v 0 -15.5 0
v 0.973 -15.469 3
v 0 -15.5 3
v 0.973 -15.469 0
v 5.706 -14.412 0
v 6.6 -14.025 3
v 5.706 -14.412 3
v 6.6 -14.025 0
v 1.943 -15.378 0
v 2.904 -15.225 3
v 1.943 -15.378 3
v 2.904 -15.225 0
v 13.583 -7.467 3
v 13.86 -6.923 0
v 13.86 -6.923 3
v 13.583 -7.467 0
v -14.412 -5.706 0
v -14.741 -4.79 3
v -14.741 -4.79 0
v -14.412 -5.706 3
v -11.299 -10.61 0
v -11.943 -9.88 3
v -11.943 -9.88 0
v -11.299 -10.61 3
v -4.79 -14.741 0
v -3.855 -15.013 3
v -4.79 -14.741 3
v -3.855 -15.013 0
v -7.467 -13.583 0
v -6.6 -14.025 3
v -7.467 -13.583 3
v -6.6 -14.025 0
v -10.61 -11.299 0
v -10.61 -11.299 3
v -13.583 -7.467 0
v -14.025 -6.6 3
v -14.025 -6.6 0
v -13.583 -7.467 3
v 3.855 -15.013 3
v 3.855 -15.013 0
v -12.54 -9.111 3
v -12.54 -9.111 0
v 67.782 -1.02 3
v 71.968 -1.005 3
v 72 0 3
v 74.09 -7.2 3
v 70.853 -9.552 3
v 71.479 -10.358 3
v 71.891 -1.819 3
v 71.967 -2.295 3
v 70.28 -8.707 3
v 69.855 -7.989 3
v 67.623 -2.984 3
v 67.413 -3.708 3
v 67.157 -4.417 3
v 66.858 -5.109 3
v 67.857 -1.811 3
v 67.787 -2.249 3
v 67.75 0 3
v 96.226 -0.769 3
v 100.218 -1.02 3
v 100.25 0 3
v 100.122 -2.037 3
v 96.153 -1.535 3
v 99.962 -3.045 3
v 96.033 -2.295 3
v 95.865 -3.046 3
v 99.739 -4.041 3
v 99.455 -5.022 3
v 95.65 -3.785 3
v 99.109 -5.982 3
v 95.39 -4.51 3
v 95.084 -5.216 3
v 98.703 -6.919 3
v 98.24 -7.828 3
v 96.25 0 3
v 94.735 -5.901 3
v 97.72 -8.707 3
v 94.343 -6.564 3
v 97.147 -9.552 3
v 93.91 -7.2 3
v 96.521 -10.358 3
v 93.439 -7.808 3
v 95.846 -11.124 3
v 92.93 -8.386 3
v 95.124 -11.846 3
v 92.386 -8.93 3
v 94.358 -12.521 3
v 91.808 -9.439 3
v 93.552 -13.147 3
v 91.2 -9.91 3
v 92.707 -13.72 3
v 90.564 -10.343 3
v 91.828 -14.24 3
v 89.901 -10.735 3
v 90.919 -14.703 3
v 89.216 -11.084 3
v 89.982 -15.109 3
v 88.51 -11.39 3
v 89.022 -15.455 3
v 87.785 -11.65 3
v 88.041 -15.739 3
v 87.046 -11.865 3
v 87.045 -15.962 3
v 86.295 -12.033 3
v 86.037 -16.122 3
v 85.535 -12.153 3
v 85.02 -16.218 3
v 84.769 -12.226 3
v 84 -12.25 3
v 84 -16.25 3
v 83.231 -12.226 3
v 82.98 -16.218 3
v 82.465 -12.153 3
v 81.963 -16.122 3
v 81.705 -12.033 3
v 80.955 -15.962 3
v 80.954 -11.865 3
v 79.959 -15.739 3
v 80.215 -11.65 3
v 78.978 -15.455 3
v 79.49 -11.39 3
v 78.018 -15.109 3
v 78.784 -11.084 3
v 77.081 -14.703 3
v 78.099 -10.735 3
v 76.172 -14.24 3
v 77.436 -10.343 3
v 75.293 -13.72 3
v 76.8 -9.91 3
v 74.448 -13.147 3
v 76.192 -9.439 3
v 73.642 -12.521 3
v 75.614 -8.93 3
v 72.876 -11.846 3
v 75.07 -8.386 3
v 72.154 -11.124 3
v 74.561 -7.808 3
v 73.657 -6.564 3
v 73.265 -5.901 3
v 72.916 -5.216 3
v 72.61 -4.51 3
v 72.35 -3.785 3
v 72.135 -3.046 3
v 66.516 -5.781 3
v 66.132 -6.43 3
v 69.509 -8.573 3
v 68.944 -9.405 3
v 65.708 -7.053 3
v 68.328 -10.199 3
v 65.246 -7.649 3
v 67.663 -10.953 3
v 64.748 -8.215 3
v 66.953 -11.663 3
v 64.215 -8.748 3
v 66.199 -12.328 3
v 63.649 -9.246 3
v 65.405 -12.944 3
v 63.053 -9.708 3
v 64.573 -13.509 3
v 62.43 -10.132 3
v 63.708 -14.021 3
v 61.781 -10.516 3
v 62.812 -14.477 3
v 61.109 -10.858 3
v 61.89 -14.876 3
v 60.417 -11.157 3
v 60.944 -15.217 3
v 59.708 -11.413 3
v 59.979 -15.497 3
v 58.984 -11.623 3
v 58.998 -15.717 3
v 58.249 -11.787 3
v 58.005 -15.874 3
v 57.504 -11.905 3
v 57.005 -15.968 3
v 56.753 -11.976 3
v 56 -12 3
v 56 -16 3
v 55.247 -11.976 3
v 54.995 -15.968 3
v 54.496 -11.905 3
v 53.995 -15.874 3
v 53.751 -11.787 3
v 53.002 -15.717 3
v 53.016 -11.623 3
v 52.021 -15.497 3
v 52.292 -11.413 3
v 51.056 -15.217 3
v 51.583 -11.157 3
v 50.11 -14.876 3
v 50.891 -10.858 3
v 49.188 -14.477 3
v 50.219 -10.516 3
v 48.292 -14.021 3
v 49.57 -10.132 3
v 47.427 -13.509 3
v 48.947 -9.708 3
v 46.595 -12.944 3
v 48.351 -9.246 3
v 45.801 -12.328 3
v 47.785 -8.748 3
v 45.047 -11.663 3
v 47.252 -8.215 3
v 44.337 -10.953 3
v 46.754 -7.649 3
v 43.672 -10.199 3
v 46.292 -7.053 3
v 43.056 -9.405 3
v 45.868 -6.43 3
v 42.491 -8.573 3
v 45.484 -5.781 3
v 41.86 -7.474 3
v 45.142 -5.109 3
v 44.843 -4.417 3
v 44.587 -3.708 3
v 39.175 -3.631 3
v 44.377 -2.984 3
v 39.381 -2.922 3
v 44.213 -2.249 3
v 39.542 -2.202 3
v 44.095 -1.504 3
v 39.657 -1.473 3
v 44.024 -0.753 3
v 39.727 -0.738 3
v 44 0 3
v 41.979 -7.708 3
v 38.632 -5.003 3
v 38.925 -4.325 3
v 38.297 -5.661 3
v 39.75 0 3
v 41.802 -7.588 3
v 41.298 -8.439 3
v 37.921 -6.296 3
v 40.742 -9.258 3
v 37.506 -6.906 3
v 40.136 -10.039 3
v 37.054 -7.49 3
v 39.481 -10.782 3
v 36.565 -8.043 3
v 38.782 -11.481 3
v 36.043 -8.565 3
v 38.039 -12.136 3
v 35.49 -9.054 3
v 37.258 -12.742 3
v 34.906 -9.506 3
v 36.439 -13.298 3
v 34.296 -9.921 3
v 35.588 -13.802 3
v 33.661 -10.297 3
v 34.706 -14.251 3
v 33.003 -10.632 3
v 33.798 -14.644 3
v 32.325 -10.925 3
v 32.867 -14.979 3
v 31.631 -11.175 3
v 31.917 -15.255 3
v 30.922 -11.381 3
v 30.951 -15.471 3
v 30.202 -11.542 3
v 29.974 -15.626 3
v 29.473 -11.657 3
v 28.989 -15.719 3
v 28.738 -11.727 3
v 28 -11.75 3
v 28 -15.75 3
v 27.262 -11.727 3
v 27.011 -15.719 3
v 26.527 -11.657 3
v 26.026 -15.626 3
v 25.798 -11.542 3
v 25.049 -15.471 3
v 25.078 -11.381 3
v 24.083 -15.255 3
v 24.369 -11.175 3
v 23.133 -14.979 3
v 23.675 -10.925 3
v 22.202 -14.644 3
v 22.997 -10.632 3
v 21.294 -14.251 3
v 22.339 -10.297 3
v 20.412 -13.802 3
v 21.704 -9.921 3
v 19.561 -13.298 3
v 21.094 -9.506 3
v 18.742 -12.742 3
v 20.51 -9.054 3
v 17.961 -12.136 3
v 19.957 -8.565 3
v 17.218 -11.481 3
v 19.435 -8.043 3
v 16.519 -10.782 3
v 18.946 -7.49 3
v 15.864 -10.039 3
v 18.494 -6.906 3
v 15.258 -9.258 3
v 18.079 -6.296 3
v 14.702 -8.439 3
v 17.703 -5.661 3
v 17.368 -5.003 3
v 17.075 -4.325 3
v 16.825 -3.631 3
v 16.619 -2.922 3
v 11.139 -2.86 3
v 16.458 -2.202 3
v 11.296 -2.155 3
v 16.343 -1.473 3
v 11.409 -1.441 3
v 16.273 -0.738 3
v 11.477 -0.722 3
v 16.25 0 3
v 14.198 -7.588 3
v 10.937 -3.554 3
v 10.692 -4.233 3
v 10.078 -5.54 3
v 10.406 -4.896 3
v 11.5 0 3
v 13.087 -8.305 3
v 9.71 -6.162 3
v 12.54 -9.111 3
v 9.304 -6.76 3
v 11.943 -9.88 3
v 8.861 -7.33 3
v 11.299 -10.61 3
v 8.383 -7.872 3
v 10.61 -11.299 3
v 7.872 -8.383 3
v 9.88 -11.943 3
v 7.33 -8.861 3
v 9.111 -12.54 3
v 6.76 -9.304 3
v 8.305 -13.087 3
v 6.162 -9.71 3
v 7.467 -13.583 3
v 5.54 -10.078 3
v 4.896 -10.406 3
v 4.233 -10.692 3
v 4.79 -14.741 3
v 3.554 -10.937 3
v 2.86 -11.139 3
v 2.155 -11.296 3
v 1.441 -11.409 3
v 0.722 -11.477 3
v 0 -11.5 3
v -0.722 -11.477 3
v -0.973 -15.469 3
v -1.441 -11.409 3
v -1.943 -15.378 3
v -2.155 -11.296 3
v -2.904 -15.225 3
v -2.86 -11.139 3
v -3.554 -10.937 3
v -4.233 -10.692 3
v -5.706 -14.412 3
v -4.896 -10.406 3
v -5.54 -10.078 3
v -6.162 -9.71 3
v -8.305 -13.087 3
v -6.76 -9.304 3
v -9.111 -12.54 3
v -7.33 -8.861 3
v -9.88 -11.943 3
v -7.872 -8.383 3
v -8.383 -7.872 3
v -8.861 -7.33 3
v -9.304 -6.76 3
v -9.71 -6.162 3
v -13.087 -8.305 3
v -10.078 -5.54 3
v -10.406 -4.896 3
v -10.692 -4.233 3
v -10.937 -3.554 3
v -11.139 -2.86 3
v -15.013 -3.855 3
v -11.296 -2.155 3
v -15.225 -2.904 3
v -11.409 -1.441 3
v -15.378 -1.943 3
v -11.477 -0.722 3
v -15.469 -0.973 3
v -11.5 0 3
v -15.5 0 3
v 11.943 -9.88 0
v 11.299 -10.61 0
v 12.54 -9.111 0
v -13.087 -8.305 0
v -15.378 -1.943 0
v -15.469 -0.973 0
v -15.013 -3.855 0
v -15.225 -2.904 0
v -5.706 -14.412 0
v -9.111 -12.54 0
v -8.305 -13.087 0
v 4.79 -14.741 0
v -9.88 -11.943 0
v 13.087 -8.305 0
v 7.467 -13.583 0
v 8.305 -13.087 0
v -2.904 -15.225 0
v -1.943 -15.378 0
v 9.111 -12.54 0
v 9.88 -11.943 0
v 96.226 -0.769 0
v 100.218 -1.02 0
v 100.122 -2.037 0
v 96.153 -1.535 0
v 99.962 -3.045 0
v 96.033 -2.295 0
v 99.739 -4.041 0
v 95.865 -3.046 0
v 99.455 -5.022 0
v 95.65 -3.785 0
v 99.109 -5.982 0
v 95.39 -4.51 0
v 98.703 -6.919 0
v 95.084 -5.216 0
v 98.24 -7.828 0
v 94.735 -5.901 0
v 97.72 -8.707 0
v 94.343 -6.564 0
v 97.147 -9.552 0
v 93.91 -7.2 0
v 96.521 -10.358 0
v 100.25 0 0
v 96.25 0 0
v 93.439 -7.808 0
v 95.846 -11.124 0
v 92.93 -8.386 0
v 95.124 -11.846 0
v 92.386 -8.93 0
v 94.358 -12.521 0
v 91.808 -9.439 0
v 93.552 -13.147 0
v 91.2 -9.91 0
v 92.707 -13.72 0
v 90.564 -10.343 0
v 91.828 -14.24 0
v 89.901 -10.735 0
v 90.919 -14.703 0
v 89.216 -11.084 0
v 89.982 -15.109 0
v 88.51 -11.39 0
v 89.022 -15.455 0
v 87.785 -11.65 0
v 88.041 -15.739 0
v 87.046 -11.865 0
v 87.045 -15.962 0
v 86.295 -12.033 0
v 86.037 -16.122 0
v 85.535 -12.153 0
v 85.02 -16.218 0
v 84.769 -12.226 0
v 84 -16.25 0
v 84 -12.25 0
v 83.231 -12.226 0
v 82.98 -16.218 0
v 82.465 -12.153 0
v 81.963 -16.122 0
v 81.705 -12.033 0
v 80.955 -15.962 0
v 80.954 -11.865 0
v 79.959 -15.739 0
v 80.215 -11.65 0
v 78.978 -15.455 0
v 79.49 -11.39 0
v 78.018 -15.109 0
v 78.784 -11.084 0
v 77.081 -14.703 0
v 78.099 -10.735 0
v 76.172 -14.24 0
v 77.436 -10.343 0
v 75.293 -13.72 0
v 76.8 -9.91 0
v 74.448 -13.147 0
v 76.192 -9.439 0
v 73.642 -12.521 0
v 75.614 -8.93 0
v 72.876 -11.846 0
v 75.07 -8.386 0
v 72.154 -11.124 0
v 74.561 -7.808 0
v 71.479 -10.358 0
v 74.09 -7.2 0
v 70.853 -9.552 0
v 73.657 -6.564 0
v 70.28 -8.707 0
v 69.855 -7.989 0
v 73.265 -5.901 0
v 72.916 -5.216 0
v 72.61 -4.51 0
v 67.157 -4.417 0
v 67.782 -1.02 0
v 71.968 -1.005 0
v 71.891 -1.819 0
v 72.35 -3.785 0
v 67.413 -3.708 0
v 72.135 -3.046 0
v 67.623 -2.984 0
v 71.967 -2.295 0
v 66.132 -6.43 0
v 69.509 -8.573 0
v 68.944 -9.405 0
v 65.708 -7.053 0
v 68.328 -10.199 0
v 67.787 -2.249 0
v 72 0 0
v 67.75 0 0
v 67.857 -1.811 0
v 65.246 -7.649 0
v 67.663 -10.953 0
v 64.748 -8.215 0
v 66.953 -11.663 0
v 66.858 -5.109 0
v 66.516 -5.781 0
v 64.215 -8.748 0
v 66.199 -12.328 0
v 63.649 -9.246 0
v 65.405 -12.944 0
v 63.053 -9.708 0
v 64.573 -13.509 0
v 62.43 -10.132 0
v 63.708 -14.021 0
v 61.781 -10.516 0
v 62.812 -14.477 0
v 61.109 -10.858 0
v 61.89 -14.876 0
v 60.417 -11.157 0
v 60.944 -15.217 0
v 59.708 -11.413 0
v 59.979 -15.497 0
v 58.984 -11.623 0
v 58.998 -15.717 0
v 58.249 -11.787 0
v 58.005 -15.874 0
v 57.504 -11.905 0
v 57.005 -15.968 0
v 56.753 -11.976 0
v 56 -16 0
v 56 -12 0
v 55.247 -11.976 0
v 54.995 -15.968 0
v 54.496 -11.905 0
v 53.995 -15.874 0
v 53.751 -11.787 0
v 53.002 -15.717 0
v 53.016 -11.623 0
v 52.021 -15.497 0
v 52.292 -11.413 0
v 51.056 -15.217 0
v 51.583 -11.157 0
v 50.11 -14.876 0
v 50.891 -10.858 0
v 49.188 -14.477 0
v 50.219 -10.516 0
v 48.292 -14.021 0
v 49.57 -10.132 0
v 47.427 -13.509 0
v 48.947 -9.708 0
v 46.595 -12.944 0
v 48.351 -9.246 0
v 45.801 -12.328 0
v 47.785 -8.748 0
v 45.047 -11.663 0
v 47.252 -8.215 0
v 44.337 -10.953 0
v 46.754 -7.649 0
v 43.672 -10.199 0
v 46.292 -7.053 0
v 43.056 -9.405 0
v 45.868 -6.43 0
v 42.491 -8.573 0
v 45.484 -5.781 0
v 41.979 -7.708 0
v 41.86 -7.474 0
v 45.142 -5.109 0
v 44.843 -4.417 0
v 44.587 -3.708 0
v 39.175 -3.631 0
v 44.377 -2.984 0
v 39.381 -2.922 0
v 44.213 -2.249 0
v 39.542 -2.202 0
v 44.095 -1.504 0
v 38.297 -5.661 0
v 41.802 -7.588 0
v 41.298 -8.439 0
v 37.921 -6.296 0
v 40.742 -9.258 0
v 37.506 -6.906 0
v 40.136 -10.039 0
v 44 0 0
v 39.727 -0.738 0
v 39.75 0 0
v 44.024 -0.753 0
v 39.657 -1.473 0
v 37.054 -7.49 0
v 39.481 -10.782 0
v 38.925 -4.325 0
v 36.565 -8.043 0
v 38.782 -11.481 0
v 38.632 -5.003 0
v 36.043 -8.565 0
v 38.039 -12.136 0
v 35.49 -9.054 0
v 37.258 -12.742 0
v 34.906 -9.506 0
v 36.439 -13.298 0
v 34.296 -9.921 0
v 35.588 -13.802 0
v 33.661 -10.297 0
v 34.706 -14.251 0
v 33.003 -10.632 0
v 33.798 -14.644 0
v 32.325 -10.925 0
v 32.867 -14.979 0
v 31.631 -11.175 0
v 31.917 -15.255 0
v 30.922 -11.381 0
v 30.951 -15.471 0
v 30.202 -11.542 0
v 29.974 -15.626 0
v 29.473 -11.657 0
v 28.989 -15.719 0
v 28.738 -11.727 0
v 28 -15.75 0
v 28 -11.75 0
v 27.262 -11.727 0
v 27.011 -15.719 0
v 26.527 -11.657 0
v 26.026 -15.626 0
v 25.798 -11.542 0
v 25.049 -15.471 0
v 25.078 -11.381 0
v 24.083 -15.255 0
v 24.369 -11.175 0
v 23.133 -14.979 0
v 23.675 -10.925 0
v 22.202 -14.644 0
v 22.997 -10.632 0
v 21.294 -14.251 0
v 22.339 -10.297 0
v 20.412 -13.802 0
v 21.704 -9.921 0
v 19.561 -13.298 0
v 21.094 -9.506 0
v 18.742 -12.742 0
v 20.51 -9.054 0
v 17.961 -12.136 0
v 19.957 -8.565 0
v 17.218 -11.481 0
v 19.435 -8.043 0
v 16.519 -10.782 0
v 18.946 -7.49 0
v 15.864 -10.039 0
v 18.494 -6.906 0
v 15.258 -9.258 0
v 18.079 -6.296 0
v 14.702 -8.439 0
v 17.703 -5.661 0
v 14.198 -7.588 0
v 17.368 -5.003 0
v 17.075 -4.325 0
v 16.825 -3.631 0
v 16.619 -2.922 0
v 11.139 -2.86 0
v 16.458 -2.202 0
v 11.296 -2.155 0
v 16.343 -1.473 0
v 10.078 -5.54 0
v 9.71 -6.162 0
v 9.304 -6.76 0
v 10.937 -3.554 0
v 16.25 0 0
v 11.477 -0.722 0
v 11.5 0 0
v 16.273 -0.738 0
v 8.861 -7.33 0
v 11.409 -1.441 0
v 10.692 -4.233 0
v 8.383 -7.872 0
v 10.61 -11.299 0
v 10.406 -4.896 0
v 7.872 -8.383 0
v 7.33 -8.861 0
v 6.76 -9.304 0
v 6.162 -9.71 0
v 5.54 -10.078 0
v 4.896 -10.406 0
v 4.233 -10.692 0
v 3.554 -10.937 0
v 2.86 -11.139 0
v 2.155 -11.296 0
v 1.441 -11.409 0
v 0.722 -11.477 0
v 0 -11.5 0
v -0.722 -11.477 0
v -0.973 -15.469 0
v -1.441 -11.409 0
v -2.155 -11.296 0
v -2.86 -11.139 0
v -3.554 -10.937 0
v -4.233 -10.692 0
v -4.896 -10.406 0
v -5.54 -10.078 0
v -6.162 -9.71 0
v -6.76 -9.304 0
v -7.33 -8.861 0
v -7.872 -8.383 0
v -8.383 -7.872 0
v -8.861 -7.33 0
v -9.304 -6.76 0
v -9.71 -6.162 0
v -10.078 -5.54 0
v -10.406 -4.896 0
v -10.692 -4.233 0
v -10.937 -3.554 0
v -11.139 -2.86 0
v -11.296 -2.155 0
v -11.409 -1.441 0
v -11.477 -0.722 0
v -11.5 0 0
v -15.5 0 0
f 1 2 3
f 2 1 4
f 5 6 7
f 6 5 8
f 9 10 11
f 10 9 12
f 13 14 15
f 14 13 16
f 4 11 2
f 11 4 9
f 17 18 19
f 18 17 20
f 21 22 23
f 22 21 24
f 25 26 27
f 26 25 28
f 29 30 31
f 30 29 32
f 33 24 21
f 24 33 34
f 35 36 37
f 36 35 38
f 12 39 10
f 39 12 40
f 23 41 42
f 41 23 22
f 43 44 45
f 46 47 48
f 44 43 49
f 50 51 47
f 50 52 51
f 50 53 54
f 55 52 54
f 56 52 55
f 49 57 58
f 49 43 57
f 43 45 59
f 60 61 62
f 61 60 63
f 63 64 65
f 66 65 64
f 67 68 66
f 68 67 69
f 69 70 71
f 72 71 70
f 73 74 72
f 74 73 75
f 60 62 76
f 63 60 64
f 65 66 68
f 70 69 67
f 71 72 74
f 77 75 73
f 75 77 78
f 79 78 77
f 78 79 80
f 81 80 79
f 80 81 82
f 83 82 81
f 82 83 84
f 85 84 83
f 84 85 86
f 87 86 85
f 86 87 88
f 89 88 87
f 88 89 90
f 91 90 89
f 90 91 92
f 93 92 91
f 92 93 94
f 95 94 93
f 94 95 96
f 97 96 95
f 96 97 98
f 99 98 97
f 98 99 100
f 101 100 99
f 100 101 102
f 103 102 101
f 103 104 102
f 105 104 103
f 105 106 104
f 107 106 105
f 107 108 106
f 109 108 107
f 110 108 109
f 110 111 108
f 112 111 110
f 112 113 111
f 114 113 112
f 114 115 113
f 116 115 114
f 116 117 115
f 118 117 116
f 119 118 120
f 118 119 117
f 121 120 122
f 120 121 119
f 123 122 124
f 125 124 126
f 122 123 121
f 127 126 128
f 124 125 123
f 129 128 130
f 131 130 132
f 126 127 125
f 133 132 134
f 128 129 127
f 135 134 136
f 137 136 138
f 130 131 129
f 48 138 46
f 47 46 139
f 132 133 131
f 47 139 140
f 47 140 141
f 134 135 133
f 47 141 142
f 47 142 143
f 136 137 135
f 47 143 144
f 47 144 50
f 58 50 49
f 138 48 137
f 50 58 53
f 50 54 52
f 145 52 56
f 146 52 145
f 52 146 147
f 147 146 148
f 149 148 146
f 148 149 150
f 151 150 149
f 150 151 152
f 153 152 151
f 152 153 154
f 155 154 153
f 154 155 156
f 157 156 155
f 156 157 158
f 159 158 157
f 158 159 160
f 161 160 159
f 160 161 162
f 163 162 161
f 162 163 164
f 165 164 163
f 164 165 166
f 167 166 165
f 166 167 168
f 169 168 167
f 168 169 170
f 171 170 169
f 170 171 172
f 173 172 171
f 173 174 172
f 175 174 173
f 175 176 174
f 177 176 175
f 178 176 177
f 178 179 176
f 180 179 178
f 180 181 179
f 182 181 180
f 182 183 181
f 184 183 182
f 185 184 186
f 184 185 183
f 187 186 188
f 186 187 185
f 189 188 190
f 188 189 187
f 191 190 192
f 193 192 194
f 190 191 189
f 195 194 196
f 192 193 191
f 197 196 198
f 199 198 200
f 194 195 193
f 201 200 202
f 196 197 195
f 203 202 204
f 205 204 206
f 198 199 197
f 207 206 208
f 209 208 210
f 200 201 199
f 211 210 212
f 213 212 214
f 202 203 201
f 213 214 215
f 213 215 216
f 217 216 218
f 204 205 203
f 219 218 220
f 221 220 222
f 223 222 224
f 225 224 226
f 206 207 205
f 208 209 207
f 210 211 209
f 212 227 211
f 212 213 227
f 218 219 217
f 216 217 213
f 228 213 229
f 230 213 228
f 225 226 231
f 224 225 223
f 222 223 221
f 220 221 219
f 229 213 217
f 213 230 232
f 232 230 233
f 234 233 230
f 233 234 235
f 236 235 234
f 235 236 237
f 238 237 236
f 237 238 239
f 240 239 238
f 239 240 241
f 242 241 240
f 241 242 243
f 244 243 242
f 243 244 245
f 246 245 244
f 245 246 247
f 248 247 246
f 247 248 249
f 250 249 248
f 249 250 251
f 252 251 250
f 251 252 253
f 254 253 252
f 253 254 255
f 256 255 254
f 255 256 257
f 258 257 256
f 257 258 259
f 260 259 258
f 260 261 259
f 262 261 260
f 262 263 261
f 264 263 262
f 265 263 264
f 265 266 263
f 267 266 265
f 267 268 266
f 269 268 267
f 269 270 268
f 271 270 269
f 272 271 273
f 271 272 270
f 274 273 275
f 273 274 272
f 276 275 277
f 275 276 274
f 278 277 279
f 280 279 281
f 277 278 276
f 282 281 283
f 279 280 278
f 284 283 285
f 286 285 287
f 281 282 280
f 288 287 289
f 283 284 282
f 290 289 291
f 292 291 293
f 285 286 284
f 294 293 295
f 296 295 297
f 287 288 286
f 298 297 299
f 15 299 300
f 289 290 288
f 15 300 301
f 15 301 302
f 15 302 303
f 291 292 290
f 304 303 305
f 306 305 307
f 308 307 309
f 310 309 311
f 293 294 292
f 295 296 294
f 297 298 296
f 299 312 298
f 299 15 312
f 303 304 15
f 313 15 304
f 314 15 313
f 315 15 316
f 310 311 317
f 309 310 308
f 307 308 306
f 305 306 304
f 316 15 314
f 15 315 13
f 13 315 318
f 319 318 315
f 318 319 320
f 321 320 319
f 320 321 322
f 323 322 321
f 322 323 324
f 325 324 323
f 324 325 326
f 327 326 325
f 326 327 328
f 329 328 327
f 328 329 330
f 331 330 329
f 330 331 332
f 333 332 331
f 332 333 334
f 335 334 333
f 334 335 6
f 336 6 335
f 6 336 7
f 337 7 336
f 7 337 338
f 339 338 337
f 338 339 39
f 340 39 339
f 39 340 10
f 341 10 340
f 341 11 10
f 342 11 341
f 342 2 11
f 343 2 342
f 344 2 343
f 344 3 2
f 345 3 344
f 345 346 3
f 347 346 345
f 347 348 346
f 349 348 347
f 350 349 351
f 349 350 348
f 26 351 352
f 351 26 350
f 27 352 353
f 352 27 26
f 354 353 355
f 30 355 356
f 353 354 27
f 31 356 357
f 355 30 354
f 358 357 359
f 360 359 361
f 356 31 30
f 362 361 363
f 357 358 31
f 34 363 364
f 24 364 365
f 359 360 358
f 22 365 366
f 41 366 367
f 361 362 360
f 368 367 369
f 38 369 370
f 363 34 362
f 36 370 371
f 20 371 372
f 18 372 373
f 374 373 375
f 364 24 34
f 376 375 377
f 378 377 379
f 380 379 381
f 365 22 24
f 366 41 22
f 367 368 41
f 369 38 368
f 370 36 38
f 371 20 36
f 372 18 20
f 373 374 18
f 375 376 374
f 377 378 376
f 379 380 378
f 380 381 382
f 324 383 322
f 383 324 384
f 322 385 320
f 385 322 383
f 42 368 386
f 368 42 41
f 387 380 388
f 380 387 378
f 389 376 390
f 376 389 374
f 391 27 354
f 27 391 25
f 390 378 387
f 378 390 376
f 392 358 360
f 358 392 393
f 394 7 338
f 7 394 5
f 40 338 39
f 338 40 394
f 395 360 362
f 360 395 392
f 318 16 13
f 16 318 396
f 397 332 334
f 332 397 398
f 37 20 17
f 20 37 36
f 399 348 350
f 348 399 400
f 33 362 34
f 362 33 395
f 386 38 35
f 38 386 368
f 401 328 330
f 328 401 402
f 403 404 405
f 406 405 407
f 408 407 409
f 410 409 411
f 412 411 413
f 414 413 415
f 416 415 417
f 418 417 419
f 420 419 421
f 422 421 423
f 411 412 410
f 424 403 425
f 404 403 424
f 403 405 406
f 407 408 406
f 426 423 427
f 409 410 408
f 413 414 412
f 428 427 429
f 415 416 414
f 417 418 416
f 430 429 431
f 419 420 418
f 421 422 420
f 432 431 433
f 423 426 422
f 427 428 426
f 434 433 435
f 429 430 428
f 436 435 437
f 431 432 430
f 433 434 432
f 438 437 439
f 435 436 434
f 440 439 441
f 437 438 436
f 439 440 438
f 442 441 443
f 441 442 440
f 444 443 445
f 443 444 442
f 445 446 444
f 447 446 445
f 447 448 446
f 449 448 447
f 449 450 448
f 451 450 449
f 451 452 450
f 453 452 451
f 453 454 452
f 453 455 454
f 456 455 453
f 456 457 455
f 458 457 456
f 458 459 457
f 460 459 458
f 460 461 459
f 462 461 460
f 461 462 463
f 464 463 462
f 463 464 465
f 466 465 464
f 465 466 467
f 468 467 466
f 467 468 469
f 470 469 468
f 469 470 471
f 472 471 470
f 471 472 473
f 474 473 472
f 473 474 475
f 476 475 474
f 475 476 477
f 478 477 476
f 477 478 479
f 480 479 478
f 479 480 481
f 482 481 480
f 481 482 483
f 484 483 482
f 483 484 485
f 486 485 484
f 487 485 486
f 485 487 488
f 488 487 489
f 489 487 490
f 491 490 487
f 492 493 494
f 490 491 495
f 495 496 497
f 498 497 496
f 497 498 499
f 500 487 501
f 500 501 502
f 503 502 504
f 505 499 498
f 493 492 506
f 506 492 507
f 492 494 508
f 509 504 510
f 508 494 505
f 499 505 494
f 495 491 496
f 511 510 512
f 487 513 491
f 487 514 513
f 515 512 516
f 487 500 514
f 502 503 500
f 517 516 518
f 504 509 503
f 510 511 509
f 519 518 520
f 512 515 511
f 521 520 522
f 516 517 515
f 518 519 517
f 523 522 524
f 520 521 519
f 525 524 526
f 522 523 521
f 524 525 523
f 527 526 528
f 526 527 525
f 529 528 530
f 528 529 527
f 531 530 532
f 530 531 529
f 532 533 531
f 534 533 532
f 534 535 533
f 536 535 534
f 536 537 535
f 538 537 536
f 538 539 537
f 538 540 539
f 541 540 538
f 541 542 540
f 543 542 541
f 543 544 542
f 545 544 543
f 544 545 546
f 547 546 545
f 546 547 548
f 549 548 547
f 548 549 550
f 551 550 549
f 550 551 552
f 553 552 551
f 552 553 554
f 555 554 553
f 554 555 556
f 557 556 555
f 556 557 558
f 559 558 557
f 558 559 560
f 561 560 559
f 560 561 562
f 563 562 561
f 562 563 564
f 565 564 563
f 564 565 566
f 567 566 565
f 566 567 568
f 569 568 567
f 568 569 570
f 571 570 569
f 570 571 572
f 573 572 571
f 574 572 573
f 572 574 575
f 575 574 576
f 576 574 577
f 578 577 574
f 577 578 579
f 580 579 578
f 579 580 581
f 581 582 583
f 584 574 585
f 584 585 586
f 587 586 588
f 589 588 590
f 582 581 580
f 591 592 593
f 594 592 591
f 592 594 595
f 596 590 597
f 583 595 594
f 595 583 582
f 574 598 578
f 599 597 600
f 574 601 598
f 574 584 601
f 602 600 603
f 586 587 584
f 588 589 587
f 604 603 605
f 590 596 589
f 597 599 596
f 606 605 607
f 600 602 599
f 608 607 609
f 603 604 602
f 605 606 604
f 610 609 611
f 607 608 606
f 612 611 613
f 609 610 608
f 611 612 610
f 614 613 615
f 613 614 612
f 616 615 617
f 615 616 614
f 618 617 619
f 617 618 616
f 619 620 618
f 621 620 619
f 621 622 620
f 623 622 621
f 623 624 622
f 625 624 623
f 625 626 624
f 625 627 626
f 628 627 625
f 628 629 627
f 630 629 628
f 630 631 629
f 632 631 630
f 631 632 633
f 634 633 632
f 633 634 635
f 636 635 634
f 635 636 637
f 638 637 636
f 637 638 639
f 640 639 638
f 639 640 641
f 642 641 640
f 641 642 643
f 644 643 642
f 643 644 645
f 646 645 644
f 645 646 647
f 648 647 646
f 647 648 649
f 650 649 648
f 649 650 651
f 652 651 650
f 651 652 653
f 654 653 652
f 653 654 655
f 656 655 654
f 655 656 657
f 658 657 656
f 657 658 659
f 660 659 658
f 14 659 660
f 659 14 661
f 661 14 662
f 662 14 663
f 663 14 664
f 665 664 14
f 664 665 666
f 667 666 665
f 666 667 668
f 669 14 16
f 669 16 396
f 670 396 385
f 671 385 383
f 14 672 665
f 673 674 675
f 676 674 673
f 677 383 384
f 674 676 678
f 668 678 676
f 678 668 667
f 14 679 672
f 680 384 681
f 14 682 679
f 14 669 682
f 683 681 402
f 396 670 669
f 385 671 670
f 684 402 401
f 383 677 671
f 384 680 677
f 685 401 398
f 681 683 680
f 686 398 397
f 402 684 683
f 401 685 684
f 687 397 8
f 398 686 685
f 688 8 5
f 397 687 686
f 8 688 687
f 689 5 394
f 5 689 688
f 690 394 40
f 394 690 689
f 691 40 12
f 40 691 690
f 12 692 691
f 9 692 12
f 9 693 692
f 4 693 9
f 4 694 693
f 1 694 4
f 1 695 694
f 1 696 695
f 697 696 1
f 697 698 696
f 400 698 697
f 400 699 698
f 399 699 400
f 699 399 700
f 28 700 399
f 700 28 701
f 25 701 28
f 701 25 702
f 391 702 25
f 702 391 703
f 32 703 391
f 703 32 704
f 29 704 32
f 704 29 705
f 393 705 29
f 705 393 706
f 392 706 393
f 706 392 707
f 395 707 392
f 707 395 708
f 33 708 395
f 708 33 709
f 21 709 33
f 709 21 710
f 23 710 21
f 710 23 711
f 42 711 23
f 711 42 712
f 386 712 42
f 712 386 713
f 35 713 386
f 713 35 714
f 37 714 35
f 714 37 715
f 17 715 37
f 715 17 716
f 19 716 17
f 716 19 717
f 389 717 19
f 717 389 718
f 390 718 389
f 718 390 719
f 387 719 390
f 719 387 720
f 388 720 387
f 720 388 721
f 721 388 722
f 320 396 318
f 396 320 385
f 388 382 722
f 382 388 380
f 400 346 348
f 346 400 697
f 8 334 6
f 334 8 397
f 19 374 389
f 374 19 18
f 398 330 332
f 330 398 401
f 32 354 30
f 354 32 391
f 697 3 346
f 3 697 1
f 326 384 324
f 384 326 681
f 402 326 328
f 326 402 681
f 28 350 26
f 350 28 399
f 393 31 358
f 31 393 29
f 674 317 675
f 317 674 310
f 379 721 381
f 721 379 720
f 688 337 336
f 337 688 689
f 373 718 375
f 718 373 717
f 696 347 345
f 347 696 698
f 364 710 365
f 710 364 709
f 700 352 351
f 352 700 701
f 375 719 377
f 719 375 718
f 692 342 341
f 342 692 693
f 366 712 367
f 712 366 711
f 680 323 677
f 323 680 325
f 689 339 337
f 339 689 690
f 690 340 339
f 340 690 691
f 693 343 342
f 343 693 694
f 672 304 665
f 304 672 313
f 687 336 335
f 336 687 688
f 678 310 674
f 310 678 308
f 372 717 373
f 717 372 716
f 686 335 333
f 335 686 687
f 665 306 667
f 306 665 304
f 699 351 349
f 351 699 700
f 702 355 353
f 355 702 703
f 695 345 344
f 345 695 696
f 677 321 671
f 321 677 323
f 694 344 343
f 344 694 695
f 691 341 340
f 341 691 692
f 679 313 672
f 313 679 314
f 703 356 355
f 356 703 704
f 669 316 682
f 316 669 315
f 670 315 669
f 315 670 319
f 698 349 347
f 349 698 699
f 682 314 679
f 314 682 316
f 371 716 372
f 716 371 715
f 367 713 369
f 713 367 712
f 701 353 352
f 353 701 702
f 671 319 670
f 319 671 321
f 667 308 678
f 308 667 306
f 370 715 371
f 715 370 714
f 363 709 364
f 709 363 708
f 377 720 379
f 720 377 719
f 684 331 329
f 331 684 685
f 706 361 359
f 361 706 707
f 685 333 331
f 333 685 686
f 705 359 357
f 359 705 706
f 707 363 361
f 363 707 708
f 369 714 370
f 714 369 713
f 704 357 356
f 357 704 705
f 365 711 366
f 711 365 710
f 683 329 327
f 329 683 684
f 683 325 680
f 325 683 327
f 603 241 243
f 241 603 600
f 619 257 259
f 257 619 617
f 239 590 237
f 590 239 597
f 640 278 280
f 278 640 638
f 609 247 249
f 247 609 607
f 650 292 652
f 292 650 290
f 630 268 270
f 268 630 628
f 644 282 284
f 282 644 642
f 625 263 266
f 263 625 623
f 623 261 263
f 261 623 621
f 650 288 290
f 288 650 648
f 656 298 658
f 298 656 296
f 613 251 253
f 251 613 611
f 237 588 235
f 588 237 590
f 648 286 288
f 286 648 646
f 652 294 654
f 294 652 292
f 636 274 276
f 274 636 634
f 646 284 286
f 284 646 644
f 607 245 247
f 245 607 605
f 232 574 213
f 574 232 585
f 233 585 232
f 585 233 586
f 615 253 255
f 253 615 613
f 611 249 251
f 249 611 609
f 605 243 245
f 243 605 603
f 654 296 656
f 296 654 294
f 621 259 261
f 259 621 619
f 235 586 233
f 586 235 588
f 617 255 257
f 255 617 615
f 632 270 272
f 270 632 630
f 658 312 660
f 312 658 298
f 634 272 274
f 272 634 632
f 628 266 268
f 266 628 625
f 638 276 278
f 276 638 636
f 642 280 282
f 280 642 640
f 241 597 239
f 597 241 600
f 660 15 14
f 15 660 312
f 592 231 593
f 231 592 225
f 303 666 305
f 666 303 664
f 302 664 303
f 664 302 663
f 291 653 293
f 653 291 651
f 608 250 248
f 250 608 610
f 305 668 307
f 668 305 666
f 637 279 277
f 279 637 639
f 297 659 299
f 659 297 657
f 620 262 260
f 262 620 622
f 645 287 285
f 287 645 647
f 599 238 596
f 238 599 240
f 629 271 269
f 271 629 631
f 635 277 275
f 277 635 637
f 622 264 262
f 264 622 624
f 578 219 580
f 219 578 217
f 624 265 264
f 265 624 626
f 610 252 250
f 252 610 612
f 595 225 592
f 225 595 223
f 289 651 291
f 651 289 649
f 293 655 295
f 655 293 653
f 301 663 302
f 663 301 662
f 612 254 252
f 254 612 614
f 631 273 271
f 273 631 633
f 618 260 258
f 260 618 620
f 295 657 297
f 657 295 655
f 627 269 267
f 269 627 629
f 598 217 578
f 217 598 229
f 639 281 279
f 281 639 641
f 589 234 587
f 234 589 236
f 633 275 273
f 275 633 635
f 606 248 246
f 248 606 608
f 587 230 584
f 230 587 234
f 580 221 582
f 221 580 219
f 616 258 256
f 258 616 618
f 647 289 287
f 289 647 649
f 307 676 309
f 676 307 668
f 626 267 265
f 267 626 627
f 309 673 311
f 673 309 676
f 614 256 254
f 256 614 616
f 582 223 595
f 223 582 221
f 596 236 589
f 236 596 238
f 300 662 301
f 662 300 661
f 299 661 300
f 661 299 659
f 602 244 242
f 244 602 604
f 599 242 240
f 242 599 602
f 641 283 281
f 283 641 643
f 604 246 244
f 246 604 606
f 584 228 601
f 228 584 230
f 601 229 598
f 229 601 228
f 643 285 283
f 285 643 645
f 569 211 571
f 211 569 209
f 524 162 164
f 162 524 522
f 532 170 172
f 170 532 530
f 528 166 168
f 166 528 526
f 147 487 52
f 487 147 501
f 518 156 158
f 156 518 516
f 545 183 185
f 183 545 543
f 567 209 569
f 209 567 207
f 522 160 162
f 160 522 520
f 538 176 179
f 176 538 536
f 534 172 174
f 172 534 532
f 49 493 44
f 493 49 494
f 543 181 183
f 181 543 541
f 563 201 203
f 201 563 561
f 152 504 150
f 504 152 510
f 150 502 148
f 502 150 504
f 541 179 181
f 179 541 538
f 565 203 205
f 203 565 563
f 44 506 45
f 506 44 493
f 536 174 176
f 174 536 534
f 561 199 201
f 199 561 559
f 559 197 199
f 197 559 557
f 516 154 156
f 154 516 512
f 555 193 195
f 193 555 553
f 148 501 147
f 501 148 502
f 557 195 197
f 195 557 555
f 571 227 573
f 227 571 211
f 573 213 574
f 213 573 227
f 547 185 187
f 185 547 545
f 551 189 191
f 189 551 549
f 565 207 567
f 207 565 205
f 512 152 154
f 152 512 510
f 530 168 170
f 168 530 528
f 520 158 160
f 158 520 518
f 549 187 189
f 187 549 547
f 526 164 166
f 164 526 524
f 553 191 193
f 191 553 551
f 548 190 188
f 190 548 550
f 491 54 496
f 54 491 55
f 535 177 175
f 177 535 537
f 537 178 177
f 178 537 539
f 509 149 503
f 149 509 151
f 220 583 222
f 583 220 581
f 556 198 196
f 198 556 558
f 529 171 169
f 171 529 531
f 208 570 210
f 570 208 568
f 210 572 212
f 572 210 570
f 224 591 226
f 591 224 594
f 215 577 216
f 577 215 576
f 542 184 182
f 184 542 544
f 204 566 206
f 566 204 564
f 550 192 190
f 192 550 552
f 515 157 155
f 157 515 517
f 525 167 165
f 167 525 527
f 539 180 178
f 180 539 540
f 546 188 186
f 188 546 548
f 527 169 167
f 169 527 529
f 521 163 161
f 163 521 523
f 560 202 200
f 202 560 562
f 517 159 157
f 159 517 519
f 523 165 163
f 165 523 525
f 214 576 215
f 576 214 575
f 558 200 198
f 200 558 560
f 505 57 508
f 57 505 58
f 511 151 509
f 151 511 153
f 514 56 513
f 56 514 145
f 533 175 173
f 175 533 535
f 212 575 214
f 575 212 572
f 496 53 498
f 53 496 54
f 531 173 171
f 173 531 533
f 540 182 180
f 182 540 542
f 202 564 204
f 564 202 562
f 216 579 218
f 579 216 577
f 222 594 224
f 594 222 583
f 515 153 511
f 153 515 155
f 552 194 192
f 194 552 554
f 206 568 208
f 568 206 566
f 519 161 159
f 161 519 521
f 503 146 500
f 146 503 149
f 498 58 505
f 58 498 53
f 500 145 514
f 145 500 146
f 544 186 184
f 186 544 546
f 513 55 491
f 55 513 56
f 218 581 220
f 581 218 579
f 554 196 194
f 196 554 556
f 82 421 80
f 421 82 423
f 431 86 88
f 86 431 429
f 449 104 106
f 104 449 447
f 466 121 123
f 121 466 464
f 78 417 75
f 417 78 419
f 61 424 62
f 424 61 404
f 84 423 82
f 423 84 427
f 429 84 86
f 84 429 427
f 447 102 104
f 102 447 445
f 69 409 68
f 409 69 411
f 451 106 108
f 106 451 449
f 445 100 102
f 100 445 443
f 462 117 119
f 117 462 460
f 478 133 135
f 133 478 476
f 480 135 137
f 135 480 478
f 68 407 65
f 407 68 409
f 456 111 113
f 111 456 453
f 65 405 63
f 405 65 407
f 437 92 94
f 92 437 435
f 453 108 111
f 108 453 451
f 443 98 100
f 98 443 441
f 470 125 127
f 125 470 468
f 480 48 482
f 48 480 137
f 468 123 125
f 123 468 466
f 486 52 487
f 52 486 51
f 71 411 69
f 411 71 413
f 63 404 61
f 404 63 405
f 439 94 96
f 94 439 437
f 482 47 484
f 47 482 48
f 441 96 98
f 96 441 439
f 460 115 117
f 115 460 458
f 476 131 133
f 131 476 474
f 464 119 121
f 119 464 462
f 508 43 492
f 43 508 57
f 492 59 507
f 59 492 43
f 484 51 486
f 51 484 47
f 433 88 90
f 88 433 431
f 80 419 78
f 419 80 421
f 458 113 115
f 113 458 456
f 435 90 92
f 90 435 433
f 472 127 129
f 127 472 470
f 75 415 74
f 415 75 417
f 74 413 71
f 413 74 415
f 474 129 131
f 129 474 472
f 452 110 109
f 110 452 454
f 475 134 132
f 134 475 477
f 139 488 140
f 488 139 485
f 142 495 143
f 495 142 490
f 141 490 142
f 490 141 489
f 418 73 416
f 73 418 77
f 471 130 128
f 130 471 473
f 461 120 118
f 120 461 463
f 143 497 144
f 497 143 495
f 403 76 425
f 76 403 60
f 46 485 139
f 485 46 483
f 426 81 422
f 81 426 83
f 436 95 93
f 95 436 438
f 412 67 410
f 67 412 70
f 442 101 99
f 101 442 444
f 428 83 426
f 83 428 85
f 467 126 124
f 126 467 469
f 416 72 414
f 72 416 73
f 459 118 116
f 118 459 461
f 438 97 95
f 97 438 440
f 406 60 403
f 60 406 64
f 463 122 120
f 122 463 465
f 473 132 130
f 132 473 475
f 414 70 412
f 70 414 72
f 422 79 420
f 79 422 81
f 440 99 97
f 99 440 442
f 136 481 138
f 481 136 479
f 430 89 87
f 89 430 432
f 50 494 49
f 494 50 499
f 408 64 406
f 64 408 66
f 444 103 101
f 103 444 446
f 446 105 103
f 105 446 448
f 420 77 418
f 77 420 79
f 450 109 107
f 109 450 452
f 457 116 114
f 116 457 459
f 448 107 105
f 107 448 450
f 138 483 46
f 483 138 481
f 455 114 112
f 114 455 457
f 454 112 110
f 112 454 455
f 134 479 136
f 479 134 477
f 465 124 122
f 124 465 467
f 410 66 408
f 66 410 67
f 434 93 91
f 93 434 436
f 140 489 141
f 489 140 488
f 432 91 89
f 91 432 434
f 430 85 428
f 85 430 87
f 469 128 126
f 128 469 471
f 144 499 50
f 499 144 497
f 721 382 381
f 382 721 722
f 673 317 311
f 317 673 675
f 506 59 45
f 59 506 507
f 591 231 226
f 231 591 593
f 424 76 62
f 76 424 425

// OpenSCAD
// testing different diameters for the base rod

$fn=100;

difference() {
	union() {
		_test(11.5);
		translate([28, 0, 0]) _test(11.75);
		translate([56, 0, 0]) _test(12);
		translate([84, 0, 0]) _test(12.25);
	}
	translate([-30, 0, 0]) cube([150, 60, 5]);
}

module _test(ir) {
	difference() {
		cylinder(h=3, r=ir + 4);
		cylinder(h=3, r=ir);
	}
}
